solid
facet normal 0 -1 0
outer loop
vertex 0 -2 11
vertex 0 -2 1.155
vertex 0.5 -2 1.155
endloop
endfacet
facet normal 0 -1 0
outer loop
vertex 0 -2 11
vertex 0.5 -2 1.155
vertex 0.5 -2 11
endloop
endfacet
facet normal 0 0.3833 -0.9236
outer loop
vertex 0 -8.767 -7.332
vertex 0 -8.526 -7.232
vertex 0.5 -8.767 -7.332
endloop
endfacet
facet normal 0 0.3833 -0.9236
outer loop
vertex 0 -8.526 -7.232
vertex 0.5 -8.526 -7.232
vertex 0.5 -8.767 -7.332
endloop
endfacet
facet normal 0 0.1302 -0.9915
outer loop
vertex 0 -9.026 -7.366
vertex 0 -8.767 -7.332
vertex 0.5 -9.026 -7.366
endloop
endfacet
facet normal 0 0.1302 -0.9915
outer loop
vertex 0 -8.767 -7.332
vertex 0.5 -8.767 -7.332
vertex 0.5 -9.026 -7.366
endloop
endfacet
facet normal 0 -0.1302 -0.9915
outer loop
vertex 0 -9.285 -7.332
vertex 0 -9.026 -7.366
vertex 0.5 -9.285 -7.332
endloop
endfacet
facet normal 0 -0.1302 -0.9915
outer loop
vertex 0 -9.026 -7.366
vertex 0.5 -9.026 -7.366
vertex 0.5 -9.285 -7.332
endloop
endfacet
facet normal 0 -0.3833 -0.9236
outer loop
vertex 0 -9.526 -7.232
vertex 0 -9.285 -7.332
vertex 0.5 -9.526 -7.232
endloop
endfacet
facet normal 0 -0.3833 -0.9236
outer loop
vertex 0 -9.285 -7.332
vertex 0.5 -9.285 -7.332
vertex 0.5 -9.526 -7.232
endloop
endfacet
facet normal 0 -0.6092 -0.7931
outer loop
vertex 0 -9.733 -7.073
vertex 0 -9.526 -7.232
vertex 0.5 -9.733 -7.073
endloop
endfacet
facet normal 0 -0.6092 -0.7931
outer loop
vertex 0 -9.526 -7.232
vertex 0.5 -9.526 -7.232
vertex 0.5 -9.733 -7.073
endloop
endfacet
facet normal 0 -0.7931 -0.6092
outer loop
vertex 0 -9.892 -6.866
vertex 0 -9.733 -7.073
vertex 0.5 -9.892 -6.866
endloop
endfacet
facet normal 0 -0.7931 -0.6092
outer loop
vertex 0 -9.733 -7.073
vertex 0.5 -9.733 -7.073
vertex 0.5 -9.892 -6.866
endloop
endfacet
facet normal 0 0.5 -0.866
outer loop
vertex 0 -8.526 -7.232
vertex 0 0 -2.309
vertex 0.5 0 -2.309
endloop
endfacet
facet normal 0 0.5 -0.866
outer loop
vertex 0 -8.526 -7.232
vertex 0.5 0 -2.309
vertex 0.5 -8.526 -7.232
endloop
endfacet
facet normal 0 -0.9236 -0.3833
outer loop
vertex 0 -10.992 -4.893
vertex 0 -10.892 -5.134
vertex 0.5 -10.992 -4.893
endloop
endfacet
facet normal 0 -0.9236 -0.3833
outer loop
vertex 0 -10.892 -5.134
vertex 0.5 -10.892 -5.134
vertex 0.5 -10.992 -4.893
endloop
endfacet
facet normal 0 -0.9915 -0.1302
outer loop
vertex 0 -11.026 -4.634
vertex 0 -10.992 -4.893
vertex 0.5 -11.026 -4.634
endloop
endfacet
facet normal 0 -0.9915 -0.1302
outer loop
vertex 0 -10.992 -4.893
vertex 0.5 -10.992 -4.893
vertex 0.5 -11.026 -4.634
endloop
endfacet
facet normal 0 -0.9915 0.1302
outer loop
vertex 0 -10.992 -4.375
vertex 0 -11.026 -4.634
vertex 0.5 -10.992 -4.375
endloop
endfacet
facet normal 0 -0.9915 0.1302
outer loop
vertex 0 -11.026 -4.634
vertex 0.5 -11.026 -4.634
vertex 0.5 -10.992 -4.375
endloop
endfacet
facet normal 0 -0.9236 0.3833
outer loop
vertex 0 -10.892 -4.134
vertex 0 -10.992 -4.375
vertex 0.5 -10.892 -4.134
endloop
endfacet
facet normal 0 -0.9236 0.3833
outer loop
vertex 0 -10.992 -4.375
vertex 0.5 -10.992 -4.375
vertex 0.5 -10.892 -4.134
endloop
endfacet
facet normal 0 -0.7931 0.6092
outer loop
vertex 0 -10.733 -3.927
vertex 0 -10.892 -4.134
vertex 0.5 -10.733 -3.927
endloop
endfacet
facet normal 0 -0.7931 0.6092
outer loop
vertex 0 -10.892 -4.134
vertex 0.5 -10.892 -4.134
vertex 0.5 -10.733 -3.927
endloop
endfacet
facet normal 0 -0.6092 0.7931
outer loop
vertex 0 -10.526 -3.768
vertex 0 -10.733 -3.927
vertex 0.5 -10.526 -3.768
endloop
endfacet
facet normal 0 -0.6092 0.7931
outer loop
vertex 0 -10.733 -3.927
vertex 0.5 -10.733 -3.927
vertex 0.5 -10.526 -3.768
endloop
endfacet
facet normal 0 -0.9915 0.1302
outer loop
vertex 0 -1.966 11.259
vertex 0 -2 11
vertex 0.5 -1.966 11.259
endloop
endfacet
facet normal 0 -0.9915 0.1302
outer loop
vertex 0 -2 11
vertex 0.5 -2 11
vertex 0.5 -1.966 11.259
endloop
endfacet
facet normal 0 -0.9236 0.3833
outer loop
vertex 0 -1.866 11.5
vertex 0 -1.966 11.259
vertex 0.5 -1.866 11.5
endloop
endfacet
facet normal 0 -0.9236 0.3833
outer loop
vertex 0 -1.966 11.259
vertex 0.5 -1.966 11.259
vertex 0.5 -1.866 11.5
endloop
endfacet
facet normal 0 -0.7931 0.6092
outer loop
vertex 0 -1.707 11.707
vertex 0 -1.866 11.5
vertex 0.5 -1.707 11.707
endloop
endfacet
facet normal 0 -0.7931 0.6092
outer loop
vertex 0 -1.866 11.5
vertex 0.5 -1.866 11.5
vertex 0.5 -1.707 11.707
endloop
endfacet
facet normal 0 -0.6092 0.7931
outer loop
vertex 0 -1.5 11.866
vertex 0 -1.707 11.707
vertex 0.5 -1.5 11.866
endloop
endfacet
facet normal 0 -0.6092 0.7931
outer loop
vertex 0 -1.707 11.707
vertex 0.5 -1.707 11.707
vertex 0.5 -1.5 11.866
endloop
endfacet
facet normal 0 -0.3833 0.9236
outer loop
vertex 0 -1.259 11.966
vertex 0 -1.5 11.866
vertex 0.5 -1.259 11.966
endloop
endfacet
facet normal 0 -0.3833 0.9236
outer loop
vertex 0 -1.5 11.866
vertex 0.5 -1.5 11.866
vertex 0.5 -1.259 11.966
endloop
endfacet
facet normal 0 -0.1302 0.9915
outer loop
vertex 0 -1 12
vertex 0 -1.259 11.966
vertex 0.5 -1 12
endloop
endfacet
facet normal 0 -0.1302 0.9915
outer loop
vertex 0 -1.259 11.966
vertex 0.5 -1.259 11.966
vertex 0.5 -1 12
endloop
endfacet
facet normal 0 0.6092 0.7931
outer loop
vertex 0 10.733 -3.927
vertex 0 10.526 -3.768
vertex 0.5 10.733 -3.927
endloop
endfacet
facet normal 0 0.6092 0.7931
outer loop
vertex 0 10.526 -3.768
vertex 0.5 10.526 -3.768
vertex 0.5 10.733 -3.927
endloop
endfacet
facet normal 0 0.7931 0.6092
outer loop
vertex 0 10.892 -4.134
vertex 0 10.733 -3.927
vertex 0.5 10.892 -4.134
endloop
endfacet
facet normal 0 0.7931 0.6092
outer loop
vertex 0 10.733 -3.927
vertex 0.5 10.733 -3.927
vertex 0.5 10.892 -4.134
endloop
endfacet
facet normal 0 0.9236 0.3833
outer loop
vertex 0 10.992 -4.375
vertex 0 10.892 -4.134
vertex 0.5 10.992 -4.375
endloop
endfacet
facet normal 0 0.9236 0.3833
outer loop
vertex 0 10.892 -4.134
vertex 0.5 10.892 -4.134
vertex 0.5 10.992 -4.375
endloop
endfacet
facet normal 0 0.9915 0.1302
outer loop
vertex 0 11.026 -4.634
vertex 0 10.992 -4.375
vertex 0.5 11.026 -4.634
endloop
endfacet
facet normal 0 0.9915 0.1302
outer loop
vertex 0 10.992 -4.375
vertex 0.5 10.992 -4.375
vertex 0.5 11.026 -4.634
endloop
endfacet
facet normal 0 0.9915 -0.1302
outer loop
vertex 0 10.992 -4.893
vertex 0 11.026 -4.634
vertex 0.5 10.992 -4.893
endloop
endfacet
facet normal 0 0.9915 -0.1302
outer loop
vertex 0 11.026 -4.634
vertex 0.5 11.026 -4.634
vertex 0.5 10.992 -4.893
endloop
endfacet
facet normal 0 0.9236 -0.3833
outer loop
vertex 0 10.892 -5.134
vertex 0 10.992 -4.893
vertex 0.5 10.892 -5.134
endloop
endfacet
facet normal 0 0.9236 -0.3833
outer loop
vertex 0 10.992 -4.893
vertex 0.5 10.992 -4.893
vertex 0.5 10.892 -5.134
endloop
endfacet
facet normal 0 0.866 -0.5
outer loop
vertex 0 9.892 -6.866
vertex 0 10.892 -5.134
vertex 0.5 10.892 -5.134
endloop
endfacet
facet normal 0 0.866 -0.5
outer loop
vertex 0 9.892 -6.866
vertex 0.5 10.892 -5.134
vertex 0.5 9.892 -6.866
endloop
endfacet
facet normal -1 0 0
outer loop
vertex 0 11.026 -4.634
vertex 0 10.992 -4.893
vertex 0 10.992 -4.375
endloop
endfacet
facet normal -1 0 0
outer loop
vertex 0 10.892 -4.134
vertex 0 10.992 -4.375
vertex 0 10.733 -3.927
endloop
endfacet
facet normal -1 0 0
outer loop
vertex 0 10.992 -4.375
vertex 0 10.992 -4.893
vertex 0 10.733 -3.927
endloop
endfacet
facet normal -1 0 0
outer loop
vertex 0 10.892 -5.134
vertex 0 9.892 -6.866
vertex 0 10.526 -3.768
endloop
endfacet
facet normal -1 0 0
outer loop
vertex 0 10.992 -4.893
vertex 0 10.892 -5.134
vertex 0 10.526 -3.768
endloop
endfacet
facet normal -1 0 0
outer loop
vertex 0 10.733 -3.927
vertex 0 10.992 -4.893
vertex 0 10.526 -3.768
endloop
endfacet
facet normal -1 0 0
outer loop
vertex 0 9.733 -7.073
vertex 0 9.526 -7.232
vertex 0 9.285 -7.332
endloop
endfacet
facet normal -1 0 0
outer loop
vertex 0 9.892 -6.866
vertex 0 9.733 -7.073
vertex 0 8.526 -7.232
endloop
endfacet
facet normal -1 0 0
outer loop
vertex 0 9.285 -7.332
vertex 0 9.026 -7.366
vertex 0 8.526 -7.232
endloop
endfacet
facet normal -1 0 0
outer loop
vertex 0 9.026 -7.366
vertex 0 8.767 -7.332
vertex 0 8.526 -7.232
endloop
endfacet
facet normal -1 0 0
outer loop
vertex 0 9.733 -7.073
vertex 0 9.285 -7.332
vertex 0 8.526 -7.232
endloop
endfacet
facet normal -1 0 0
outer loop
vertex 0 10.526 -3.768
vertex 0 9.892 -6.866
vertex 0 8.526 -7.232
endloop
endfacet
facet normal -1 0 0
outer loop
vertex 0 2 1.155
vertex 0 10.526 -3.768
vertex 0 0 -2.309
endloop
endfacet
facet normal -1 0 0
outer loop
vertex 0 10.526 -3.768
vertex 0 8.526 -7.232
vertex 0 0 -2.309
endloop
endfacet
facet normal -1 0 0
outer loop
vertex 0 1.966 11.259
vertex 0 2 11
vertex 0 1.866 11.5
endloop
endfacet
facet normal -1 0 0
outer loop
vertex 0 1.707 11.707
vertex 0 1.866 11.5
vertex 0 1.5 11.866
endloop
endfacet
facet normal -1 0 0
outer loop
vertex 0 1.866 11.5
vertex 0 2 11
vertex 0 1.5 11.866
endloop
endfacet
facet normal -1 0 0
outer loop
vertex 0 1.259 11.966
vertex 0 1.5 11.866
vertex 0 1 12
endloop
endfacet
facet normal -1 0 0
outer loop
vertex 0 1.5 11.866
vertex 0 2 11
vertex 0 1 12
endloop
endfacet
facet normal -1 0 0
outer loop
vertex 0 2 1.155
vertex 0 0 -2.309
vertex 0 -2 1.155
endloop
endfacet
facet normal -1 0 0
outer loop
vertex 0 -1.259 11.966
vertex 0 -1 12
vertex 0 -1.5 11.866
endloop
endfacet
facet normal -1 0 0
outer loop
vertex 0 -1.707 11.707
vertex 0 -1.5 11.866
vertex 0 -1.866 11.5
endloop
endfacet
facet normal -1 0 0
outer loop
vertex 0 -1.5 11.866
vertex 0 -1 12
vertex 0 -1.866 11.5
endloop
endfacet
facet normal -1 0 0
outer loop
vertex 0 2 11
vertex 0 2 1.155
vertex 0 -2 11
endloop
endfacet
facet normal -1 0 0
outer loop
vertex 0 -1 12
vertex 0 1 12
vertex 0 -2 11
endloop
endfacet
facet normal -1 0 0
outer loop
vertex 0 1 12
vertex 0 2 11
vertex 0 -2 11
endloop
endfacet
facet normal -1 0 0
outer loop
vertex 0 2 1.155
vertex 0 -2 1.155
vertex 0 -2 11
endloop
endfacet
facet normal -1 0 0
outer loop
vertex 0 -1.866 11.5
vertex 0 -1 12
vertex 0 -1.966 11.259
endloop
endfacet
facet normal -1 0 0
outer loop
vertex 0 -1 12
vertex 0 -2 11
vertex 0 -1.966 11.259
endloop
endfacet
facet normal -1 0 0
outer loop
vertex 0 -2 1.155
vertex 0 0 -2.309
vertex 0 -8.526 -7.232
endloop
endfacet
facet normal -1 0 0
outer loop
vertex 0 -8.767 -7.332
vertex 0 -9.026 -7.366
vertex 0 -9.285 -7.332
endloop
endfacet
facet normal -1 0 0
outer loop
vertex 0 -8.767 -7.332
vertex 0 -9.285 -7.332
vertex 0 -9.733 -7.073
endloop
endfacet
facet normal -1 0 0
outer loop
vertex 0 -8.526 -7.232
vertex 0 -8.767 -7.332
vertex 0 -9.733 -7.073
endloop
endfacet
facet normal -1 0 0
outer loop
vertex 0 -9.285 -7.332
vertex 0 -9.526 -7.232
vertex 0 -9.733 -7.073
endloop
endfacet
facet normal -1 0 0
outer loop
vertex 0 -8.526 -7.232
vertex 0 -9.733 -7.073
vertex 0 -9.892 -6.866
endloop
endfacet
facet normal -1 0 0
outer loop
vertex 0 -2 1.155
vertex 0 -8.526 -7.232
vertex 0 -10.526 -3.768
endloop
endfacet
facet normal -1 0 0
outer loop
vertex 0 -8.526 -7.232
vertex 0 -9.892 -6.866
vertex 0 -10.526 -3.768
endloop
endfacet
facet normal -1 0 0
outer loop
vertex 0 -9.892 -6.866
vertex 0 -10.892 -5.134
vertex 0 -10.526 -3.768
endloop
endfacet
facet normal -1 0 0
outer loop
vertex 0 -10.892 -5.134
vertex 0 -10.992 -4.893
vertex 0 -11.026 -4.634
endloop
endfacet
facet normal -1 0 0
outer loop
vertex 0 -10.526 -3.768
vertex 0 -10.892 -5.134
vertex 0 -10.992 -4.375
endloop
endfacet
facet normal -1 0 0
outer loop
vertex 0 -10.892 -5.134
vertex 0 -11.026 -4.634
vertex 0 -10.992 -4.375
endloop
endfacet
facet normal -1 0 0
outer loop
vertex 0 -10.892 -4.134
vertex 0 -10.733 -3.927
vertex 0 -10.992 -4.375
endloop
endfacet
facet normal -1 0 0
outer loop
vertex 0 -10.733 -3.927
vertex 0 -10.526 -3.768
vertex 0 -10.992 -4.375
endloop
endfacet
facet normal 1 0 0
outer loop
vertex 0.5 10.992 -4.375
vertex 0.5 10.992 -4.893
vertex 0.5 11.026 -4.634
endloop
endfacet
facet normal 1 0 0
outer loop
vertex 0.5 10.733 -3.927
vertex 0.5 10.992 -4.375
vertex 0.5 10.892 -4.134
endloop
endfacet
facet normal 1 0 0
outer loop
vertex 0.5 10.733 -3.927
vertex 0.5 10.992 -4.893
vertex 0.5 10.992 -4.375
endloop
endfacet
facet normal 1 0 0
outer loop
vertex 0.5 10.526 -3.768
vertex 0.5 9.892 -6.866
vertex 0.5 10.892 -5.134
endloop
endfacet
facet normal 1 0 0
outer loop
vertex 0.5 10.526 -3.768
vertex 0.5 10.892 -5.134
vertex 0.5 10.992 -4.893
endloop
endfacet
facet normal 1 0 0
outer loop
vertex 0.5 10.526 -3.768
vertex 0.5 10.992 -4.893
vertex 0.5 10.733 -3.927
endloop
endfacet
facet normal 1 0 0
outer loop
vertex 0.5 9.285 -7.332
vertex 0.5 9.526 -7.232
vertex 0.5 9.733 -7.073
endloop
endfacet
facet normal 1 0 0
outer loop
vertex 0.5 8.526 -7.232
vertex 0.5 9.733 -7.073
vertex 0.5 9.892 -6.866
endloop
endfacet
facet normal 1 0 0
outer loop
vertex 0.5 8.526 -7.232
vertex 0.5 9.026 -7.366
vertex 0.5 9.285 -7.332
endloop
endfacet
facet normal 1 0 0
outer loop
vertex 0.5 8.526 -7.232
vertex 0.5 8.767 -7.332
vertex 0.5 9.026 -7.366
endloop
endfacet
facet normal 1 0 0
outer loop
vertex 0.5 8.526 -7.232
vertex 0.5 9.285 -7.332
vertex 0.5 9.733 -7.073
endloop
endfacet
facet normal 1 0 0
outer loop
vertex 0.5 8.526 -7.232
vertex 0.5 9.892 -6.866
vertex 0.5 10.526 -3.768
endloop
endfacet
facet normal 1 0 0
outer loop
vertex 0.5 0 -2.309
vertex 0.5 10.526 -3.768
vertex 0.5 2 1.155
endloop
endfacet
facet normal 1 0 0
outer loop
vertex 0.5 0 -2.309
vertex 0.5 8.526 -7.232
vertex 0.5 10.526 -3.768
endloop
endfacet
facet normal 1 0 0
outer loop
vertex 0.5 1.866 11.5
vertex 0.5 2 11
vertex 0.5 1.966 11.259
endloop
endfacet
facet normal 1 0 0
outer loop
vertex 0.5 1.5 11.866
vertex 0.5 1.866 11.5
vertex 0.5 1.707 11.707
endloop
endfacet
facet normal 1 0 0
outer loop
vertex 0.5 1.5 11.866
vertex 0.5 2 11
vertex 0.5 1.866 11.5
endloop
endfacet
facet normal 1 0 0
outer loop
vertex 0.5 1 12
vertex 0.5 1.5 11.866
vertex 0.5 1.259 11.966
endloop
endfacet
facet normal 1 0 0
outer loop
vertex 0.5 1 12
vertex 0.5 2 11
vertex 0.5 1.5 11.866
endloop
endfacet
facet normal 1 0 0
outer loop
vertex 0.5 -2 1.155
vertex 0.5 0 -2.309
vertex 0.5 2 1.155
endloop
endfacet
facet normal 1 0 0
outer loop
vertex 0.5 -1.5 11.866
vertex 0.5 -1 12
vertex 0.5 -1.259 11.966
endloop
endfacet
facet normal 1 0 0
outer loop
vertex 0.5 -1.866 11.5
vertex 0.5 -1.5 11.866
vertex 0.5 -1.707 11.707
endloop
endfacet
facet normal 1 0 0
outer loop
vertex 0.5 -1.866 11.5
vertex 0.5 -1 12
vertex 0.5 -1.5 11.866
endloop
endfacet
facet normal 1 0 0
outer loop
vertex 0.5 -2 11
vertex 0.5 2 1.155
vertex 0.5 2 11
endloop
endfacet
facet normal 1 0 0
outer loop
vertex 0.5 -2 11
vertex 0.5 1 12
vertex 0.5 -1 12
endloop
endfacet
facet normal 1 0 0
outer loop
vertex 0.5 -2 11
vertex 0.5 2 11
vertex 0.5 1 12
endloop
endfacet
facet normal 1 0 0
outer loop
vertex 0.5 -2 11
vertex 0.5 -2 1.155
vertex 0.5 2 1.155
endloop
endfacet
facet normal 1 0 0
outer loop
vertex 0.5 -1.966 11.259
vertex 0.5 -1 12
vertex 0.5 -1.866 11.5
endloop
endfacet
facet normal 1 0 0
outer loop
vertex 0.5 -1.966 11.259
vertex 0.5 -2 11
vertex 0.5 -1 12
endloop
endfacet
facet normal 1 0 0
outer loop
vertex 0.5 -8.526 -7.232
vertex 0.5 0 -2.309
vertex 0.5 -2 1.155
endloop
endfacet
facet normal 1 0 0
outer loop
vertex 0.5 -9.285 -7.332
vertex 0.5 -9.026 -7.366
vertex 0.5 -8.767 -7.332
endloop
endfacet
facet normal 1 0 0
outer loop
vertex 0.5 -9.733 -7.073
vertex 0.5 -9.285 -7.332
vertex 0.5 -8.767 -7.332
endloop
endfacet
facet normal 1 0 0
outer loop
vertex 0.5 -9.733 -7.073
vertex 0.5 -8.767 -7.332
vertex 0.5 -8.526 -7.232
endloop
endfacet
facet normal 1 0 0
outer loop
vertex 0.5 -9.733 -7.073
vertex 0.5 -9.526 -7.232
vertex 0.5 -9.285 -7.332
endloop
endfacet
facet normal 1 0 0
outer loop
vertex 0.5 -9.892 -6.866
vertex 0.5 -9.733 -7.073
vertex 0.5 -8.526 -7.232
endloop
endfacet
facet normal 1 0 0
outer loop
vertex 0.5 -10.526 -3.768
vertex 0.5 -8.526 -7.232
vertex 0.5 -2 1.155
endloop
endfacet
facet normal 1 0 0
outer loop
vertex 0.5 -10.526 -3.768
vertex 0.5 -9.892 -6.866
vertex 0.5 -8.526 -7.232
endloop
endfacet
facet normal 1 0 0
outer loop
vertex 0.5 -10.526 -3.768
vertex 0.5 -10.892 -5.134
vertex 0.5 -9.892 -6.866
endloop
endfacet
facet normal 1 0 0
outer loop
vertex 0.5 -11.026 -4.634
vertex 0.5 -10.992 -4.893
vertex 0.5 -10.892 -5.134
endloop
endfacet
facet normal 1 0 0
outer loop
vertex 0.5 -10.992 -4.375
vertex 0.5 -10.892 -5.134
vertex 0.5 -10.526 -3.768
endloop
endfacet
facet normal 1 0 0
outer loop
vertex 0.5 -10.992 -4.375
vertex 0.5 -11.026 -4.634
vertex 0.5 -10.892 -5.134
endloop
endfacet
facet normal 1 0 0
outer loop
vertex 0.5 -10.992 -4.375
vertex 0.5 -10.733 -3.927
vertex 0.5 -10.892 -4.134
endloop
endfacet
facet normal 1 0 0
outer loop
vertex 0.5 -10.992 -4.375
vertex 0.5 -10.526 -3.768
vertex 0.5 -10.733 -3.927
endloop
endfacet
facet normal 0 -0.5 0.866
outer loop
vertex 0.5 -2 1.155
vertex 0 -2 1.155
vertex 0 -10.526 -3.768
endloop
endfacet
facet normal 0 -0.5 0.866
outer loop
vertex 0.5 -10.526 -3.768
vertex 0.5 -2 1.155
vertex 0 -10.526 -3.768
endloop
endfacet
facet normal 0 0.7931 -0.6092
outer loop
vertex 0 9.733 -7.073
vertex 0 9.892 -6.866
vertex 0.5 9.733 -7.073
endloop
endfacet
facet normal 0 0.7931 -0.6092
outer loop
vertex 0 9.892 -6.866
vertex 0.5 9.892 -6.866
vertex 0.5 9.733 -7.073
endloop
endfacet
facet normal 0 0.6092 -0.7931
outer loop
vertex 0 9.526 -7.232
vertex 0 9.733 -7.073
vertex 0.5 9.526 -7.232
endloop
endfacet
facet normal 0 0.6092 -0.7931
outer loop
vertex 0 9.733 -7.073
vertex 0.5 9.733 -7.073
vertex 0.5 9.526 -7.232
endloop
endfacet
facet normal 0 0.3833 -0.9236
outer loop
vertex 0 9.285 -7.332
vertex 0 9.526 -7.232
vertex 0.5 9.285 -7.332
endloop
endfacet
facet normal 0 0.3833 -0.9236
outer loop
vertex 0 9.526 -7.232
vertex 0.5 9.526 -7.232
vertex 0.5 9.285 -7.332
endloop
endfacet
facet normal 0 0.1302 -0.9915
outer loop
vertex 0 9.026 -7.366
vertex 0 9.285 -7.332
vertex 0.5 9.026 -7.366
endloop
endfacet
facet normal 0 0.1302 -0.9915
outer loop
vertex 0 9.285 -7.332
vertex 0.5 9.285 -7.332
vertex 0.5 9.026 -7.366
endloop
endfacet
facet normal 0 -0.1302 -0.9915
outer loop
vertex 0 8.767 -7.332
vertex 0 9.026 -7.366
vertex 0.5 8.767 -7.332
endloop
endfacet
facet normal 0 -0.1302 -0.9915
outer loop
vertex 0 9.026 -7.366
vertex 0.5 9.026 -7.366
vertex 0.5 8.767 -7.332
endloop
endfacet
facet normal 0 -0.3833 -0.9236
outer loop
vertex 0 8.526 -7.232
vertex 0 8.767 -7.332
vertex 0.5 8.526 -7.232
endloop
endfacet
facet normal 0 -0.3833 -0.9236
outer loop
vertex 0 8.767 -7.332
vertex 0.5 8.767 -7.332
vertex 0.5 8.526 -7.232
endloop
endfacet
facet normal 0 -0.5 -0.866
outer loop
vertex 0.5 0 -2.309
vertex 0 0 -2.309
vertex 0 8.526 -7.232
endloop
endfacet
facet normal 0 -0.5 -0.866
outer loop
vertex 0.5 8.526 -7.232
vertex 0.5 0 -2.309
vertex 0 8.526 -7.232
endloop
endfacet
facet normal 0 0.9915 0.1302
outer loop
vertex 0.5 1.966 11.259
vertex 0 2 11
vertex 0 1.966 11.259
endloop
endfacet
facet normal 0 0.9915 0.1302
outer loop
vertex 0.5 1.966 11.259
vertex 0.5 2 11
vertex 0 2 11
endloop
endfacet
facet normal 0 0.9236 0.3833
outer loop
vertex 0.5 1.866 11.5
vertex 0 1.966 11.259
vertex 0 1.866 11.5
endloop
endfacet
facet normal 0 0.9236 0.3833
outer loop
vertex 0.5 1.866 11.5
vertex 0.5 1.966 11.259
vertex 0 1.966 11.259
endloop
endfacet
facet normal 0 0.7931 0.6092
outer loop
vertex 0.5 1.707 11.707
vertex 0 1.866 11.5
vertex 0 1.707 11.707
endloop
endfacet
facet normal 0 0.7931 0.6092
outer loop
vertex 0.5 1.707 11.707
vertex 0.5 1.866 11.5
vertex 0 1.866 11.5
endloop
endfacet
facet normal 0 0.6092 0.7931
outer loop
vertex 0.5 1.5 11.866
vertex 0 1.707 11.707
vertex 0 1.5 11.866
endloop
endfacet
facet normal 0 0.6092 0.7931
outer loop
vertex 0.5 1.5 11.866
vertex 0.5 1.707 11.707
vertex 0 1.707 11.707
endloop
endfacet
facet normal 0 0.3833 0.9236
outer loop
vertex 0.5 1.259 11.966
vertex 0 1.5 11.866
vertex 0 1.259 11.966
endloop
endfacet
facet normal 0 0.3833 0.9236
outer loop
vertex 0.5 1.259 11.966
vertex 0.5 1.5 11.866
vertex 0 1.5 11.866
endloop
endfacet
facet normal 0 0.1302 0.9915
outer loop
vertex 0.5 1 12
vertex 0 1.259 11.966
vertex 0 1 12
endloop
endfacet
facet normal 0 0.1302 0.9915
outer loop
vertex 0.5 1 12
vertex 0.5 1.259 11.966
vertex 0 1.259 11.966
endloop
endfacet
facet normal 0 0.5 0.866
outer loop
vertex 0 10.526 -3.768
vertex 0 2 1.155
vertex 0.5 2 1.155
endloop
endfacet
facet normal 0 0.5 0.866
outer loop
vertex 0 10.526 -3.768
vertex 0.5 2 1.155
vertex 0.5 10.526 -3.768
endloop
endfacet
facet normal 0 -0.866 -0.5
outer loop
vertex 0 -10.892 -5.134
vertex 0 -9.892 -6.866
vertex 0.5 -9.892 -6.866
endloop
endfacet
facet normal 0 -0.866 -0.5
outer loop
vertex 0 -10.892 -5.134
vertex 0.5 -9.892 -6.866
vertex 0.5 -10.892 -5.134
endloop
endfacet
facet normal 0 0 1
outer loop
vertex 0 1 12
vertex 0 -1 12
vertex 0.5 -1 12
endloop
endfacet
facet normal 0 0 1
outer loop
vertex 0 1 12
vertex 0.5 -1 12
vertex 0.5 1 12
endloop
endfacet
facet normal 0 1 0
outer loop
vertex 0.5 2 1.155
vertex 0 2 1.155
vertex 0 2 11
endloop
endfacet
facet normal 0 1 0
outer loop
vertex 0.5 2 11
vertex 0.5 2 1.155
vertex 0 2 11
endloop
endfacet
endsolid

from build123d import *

# Parameters (mm, degrees)
SKETCH1_W                = 4
SKETCH1_H                = 12
EXTRUDE_THIN2_DEPTH      = 0.5
FILLET2_R                = 1
CIRPATTERN1_COUNT        = 3
FILLET2_OF_CIRPATTERN1_R = 1


with BuildPart() as part:
    # Sketch1 → Extrude-Thin2 (new body)
    with BuildSketch(Plane.YZ):
        with Locations((0, 6)):
            Rectangle(SKETCH1_W, SKETCH1_H)
    extrude_thin2 = extrude(amount=EXTRUDE_THIN2_DEPTH)

    # Fillet2
    fillet2_edges = [part.edges().sort_by_distance(p)[0] for p in [
        (0.25, -2, 12),
        (0.25, 2, 12),
    ]]
    fillet(fillet2_edges, radius=FILLET2_R)

    # CirPattern1: Extrude-Thin2 ×3 about axis
    cirpattern1_axis = Axis((0, 0, 0), (1, 0, 0))
    for i in range(1, CIRPATTERN1_COUNT):
        add(extrude_thin2.rotate(cirpattern1_axis, i * 360 / CIRPATTERN1_COUNT))

    # Fillet2 of CirPattern1
    fillet2_of_cirpattern1_edges = [part.edges().sort_by_distance(p)[0] for p in [
        (0.25, -9.392304845, -7.732050808),
        (0.25, -11.392304845, -4.267949192),
        (0.25, 11.392304845, -4.267949192),
        (0.25, 9.392304845, -7.732050808),
    ]]
    fillet(fillet2_of_cirpattern1_edges, radius=FILLET2_OF_CIRPATTERN1_R)


solid = part.part
